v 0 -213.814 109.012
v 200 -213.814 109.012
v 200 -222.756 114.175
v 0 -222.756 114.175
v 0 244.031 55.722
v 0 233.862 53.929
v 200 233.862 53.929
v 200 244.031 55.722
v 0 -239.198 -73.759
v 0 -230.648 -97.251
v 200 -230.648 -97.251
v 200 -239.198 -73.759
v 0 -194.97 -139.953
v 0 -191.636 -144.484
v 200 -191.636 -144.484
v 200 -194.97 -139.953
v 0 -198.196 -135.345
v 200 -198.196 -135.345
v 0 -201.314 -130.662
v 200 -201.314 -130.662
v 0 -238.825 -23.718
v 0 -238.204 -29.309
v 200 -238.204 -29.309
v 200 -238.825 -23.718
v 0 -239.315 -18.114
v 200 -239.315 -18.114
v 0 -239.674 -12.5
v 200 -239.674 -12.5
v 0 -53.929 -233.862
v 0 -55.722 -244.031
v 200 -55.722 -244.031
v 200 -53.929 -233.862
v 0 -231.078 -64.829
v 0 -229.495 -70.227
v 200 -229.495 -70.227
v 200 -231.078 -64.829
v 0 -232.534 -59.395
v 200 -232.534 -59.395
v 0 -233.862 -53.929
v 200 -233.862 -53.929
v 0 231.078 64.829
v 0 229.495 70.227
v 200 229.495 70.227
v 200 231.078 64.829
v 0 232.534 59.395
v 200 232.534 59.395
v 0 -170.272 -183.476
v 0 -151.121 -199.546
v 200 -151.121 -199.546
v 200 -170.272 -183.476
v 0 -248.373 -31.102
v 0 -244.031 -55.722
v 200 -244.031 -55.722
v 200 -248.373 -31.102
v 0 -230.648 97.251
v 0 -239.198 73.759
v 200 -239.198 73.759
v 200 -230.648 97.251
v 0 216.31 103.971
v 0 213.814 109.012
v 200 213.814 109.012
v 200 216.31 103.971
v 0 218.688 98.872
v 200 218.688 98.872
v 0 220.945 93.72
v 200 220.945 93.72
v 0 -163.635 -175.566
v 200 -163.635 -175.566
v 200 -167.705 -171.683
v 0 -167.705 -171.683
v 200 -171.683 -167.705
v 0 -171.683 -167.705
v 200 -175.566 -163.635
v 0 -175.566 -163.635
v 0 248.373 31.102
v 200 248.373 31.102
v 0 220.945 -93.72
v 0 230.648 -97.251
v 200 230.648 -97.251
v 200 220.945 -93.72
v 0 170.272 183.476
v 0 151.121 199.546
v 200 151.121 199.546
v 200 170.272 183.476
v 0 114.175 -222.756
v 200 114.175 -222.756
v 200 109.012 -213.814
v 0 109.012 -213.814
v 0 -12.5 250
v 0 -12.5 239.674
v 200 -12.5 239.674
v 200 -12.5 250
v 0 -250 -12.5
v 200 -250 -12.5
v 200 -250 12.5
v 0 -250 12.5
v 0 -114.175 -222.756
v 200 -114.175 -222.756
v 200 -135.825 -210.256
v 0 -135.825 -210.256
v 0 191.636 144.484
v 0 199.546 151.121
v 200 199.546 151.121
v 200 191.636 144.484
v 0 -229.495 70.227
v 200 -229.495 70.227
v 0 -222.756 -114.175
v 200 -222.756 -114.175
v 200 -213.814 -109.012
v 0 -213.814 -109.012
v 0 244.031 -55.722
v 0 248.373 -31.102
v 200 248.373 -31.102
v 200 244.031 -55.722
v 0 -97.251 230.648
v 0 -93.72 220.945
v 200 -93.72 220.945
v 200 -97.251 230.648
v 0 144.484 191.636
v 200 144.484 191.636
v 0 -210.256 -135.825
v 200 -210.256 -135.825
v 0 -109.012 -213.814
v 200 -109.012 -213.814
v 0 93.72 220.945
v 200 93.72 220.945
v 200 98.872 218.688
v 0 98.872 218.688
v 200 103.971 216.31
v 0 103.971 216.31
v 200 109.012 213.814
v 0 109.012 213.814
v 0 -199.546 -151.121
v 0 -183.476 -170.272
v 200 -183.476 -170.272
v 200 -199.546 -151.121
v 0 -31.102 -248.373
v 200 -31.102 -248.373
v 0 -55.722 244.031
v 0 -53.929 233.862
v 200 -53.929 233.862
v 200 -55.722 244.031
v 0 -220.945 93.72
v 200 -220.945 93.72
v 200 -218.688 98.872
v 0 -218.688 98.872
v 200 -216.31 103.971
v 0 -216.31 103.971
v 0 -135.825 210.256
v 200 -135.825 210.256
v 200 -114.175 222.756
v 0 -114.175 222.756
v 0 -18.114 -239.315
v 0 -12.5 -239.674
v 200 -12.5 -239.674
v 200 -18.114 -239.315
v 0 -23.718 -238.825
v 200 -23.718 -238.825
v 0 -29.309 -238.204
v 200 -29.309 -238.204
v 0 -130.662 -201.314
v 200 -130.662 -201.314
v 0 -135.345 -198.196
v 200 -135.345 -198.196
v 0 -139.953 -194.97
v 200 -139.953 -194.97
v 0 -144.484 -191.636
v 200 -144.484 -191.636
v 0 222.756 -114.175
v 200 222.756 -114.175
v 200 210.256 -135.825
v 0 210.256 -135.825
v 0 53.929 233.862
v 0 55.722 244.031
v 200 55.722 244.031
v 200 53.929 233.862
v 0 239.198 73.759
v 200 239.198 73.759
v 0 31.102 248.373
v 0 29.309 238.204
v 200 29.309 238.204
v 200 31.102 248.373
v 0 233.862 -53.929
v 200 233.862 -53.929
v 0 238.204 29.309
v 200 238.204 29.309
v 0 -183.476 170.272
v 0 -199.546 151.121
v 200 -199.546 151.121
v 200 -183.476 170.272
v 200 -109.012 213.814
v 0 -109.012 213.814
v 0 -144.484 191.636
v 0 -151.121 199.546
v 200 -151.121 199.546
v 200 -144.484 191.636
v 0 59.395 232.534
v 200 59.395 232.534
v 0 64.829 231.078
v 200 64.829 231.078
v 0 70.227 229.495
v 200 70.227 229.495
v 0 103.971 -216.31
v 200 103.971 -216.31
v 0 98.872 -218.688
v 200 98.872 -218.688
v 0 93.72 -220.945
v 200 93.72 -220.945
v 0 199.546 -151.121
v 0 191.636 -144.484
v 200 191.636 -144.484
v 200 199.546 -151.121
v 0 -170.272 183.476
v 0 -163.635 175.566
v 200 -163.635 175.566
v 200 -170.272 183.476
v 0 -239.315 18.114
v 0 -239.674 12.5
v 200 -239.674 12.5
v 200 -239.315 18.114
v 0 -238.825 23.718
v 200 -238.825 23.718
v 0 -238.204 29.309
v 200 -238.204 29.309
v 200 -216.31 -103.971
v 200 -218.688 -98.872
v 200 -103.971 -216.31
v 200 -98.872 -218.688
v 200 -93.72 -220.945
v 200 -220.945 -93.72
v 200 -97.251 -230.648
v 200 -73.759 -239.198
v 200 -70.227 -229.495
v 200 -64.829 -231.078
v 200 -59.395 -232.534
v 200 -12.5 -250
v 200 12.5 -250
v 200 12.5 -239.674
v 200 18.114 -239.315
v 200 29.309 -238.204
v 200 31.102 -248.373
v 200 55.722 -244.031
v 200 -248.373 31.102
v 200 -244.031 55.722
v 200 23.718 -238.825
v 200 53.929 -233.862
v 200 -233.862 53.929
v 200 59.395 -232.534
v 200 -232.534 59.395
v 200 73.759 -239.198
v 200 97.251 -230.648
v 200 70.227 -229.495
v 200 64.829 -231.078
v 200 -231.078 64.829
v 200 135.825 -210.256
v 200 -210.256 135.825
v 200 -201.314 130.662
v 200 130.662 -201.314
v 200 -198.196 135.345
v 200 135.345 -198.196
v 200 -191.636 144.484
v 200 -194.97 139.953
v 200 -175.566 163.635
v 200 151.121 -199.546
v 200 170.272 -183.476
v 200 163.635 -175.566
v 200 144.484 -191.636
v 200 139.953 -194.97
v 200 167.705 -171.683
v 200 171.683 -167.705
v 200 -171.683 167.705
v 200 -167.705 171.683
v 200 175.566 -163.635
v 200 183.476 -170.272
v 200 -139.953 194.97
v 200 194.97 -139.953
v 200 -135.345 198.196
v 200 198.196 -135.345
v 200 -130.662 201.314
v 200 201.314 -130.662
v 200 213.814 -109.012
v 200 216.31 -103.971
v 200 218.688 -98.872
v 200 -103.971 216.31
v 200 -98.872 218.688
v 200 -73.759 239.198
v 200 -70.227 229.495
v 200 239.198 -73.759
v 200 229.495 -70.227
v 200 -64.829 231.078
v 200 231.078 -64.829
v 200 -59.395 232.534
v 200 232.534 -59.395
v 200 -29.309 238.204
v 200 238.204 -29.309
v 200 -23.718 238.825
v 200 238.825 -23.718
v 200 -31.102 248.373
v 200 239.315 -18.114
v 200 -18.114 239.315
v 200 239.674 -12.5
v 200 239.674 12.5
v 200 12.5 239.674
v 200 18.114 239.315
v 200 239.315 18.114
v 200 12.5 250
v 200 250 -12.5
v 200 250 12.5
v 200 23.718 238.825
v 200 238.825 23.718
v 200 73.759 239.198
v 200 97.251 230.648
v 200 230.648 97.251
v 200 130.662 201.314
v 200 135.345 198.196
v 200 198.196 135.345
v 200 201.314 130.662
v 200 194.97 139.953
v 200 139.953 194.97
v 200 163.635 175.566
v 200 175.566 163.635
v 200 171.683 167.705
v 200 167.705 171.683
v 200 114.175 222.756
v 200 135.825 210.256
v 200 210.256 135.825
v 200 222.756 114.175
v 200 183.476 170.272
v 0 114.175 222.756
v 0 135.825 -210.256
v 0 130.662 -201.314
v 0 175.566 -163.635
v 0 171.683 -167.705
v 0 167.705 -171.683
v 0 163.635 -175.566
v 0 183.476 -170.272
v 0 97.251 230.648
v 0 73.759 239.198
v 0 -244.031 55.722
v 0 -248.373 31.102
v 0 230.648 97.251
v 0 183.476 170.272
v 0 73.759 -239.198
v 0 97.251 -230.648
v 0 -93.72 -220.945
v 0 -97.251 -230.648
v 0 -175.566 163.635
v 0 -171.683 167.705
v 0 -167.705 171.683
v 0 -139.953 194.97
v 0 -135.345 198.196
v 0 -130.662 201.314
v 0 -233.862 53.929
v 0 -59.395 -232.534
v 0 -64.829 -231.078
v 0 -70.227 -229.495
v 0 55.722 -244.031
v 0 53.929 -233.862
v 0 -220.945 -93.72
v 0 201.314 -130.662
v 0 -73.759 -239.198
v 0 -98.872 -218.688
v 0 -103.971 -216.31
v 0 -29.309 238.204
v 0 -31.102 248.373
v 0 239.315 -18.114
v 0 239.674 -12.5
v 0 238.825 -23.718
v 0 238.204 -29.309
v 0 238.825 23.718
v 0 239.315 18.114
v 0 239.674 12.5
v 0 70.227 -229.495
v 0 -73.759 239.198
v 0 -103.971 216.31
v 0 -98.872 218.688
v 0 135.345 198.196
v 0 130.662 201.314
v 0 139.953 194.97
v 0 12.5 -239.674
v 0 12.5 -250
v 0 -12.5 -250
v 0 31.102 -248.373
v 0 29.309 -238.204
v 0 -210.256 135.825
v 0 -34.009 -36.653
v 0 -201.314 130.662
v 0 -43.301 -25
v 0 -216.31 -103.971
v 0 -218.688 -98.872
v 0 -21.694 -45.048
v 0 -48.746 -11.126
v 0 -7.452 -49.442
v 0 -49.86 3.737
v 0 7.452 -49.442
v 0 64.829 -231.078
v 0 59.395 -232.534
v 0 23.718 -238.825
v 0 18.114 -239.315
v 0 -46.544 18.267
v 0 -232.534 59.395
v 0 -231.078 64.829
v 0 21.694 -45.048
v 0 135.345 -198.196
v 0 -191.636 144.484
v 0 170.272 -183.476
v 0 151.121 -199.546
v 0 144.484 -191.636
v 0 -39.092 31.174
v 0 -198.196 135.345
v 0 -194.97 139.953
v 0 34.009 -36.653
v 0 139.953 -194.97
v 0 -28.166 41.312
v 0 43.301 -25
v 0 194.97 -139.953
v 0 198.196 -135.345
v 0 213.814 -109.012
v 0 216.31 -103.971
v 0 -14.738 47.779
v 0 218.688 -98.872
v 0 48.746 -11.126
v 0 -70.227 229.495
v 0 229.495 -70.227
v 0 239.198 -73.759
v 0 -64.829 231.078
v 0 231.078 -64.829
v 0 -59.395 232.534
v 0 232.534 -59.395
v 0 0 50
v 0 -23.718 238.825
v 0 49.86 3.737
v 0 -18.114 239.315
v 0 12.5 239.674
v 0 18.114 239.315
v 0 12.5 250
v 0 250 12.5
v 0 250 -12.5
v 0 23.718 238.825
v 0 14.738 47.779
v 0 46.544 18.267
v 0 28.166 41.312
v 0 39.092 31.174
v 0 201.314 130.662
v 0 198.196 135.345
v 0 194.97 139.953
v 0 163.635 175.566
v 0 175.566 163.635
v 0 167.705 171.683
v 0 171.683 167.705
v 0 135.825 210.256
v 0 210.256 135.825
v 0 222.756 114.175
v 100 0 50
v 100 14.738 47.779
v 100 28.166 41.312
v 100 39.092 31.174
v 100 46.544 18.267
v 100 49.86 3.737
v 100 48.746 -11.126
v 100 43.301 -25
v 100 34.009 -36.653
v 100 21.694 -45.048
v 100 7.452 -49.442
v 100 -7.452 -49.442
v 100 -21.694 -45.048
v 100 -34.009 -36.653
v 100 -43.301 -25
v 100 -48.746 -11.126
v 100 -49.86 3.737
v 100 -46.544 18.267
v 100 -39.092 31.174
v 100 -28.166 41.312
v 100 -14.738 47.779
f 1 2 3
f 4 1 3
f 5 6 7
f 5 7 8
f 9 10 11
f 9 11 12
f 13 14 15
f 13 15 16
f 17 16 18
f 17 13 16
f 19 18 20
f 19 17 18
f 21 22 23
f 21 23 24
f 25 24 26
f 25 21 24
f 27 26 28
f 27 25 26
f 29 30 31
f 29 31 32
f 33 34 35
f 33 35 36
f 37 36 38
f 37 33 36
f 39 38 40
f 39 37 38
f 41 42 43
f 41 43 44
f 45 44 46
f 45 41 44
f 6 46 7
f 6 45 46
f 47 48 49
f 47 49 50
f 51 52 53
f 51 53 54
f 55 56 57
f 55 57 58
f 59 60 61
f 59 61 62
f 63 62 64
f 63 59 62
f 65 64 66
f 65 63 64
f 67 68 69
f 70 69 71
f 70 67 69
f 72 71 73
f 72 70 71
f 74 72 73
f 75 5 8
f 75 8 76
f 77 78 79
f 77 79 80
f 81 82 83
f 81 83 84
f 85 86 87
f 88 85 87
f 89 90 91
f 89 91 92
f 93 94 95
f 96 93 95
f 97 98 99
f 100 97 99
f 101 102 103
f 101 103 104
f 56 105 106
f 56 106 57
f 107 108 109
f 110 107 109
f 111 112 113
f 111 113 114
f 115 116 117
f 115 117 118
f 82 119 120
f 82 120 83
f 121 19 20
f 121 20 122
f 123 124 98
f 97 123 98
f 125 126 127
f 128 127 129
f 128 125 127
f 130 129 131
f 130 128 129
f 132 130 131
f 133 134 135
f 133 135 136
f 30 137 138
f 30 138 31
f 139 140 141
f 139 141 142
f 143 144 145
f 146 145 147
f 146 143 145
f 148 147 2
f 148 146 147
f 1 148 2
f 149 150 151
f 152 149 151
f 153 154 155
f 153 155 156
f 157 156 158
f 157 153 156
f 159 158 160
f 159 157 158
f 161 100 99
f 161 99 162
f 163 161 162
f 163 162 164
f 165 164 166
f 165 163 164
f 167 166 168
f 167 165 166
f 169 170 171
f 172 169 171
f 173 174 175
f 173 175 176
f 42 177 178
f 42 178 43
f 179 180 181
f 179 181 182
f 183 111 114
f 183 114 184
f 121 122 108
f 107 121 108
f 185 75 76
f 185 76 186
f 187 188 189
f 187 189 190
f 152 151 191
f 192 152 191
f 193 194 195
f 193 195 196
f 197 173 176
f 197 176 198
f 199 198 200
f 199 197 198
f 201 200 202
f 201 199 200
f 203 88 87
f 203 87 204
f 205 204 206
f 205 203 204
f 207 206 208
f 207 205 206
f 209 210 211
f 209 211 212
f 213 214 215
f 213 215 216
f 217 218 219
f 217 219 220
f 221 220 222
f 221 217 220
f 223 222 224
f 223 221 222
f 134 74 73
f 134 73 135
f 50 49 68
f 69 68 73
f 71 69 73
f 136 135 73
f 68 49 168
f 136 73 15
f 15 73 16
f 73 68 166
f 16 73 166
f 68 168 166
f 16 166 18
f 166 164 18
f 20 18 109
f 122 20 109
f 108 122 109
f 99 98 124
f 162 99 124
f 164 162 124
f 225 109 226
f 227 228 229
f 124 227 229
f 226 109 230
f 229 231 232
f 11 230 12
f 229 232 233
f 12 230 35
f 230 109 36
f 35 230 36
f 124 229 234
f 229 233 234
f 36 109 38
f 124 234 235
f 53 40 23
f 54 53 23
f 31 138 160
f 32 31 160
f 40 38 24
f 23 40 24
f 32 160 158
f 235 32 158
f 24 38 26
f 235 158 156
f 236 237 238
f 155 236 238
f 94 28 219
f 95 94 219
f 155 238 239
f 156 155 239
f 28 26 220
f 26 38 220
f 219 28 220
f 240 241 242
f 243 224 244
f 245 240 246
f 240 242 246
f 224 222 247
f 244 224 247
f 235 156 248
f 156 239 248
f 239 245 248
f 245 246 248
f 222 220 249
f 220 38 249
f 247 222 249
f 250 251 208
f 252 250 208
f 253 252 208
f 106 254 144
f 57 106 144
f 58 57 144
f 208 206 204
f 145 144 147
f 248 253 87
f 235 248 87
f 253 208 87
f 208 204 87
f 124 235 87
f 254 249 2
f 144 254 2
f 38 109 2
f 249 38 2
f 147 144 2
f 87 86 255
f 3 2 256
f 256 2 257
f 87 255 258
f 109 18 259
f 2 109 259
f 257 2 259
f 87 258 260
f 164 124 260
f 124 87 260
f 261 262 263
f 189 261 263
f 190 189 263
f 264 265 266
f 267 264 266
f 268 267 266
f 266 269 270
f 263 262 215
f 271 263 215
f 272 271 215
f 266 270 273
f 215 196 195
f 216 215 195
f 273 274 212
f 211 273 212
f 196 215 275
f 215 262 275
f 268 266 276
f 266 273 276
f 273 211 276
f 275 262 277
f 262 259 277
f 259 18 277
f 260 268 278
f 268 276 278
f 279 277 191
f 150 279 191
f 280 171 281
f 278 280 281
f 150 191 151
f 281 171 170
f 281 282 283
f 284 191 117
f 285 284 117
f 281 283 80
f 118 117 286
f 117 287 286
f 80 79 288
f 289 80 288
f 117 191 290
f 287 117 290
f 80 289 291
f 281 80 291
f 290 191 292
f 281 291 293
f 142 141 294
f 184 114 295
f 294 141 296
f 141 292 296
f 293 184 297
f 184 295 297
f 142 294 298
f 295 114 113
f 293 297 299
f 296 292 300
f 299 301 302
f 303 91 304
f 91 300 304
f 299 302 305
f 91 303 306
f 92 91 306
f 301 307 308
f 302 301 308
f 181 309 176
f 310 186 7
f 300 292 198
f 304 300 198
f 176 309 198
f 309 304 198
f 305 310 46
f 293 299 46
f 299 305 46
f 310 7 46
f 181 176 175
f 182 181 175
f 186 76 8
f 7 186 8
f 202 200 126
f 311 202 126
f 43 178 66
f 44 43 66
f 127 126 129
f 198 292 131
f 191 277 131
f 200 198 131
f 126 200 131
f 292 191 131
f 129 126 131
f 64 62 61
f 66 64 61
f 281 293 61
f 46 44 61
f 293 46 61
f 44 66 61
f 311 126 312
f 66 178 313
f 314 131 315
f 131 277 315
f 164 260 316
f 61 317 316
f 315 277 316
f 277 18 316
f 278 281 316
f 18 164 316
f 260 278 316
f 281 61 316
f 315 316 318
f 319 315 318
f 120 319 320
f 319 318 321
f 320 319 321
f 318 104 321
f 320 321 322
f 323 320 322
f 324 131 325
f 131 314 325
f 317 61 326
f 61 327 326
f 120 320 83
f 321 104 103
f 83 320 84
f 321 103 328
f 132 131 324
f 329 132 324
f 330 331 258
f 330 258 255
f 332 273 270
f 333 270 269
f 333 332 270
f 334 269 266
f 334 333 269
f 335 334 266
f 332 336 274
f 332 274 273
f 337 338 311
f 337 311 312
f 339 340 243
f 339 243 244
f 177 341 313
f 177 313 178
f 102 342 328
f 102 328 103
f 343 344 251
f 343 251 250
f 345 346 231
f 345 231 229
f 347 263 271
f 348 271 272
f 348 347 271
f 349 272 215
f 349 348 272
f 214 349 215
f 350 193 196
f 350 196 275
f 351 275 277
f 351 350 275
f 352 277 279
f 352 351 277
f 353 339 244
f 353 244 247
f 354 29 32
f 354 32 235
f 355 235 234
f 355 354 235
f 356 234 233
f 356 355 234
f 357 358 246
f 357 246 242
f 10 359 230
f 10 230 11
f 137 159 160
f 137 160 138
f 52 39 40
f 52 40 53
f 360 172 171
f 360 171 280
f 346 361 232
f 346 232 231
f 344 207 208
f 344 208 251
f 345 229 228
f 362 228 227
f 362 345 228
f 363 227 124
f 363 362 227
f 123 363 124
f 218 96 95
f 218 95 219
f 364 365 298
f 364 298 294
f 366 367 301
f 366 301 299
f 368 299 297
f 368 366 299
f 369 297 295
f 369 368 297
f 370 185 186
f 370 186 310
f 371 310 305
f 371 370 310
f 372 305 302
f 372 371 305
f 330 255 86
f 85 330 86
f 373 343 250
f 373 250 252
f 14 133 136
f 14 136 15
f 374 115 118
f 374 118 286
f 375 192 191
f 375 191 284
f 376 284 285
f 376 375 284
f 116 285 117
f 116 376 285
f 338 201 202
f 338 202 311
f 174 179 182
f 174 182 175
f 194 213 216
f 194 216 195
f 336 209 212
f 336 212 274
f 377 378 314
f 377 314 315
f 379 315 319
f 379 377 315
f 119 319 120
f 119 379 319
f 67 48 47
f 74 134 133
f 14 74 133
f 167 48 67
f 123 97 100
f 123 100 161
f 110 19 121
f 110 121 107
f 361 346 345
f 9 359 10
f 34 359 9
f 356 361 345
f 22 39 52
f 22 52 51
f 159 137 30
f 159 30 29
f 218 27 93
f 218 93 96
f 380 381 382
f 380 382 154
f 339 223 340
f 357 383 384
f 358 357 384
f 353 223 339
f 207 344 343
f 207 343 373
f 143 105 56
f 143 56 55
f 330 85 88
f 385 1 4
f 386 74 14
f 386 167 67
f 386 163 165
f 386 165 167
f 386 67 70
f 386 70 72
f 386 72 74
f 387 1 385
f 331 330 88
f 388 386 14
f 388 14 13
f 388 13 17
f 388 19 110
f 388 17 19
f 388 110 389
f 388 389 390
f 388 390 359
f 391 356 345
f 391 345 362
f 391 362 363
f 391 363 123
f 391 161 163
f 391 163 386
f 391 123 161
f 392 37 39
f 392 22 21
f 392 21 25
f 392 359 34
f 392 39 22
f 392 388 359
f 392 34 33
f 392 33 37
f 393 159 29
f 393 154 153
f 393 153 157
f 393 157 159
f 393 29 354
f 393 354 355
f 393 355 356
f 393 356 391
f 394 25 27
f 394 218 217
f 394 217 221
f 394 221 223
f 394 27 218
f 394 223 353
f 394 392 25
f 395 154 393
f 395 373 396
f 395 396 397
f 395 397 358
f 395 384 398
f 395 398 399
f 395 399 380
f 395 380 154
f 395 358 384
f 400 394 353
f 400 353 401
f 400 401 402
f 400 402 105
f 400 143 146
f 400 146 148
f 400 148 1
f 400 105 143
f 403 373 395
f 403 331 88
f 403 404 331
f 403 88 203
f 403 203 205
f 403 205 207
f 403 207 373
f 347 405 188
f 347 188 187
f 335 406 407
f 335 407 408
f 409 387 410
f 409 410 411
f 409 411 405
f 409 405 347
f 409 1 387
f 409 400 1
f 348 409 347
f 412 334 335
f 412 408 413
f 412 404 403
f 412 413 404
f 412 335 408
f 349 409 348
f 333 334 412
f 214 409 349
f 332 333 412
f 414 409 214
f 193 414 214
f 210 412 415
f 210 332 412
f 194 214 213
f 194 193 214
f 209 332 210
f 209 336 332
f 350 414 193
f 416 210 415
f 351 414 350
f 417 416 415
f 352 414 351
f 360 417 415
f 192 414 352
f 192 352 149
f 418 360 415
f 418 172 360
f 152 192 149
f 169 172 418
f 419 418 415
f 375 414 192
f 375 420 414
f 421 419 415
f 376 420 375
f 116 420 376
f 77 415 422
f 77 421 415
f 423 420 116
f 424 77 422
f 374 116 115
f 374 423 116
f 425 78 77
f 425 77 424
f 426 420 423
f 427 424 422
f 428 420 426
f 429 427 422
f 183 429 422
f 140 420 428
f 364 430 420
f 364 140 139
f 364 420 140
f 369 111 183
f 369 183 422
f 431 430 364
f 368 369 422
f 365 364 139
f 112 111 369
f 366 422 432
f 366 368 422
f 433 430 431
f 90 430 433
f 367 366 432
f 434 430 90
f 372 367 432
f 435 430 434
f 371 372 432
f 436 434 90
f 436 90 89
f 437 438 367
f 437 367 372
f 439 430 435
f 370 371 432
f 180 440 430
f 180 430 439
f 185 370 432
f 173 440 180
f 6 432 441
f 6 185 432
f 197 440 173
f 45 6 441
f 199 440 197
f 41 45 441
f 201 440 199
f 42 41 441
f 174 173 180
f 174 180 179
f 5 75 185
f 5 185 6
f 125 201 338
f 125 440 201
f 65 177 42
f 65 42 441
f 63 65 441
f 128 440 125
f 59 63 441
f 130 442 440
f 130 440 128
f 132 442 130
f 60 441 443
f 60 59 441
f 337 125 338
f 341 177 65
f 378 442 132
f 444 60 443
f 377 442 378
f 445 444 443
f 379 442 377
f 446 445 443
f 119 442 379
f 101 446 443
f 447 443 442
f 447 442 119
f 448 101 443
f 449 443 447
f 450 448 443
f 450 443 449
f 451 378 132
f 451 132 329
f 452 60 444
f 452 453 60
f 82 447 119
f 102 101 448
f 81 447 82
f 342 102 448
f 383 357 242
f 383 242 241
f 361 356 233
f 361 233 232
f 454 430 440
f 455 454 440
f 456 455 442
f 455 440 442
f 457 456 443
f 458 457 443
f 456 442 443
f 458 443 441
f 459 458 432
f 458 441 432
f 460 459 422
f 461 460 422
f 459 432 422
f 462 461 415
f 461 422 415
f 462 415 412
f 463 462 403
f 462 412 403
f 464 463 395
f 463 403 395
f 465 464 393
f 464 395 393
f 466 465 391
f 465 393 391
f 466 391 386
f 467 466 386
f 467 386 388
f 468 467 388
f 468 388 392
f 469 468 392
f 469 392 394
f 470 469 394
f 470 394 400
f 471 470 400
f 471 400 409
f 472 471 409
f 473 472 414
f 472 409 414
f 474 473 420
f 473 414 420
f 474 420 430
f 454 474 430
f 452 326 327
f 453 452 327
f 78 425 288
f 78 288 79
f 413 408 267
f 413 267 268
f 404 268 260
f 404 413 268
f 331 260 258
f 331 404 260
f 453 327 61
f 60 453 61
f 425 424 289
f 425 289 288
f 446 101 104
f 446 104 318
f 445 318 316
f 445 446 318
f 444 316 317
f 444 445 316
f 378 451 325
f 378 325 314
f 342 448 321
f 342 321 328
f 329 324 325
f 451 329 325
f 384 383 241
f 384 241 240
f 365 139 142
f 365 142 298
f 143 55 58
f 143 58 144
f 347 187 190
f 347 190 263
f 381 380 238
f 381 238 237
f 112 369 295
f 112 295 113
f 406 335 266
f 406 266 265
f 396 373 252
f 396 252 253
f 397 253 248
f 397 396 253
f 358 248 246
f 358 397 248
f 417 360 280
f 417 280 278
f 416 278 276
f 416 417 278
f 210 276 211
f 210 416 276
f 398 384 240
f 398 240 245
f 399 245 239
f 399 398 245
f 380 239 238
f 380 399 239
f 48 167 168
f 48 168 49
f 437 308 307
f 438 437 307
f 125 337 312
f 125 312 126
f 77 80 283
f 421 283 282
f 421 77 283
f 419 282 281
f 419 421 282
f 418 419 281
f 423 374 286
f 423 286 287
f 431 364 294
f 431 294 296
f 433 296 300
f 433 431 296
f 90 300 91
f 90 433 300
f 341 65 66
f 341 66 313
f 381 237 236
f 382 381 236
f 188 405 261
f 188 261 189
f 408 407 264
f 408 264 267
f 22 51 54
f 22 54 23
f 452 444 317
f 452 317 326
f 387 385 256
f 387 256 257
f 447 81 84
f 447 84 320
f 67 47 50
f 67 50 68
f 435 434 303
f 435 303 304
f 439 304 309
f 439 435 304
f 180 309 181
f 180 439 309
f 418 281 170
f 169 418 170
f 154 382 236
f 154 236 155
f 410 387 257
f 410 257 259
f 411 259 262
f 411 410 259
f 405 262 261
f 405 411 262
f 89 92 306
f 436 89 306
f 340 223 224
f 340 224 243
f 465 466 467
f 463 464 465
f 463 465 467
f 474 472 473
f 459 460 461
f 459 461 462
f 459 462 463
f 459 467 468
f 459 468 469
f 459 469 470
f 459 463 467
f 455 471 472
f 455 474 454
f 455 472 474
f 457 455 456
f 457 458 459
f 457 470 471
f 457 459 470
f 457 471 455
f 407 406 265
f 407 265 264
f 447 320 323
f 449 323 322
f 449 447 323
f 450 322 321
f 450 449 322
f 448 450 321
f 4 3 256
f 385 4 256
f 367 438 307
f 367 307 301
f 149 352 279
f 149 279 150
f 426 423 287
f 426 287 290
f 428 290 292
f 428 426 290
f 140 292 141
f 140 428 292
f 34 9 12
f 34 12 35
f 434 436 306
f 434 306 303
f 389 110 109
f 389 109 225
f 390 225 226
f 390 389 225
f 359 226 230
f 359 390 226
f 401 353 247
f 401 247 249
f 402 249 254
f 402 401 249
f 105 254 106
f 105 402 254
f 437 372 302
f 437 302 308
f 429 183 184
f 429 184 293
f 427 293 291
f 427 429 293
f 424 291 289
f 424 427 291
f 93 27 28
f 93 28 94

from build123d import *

# Parameters (mm, degrees)
BOSS_EXTRUDE1_DEPTH = 200
SKETCH2_R           = 50
CUT_EXTRUDE1_DEPTH  = 100


with BuildPart() as part:
    # Sketch1 → Boss-Extrude1 (new body)
    with BuildSketch(Plane(origin=(0, 0, 0), x_dir=(0, 0, -1), z_dir=(1, 0, 0))):
        with BuildLine():
            Line((-12.5, 250), (12.5, 250))
            Line((12.5, 250), (12.5, 239.674258109))
            ThreePointArc((12.5, 239.674258109), (20.917378259, 239.086727542), (29.308901242, 238.203669804))
            Line((29.308901242, 238.203669804), (31.101947504, 248.372540474))
            Line((31.101947504, 248.372540474), (55.722141329, 244.031336032))
            Line((55.722141329, 244.031336032), (53.929095067, 233.862465362))
            ThreePointArc((53.929095067, 233.862465362), (62.116570825, 231.822198309), (70.22726635, 229.495383529))
            Line((70.22726635, 229.495383529), (73.758878072, 239.198406988))
            Line((73.758878072, 239.198406988), (97.251193591, 230.647903405))
            Line((97.251193591, 230.647903405), (93.71958187, 220.944879946))
            ThreePointArc((93.71958187, 220.944879946), (101.428382818, 217.513868889), (109.011811507, 213.813996155))
            Line((109.011811507, 213.813996155), (114.174682453, 222.756350946))
            Line((114.174682453, 222.756350946), (135.825317547, 210.256350946))
            Line((135.825317547, 210.256350946), (130.662446602, 201.313996155))
            ThreePointArc((130.662446602, 201.313996155), (137.658344724, 196.596490629), (144.484087934, 191.635978704))
            Line((144.484087934, 191.635978704), (151.121346883, 199.545955901))
            Line((151.121346883, 199.545955901), (170.272457961, 183.476265659))
            Line((170.272457961, 183.476265659), (163.635199012, 175.566288462))
            ThreePointArc((163.635199012, 175.566288462), (169.705627485, 169.705627485), (175.566288462, 163.635199012))
            Line((175.566288462, 163.635199012), (183.476265659, 170.272457961))
            Line((183.476265659, 170.272457961), (199.545955901, 151.121346883))
            Line((199.545955901, 151.121346883), (191.635978704, 144.484087934))
            ThreePointArc((191.635978704, 144.484087934), (196.596490629, 137.658344724), (201.313996155, 130.662446602))
            Line((201.313996155, 130.662446602), (210.256350946, 135.825317547))
            Line((210.256350946, 135.825317547), (222.756350946, 114.174682453))
            Line((222.756350946, 114.174682453), (213.813996155, 109.011811507))
            ThreePointArc((213.813996155, 109.011811507), (217.513868889, 101.428382818), (220.944879946, 93.71958187))
            Line((220.944879946, 93.71958187), (230.647903405, 97.251193591))
            Line((230.647903405, 97.251193591), (239.198406988, 73.758878072))
            Line((239.198406988, 73.758878072), (229.495383529, 70.22726635))
            ThreePointArc((229.495383529, 70.22726635), (231.822198309, 62.116570825), (233.862465362, 53.929095067))
            Line((233.862465362, 53.929095067), (244.031336032, 55.722141329))
            Line((244.031336032, 55.722141329), (248.372540474, 31.101947504))
            Line((248.372540474, 31.101947504), (238.203669804, 29.308901242))
            ThreePointArc((238.203669804, 29.308901242), (239.086727542, 20.917378259), (239.674258109, 12.5))
            Line((239.674258109, 12.5), (250, 12.5))
            Line((250, 12.5), (250, -12.5))
            Line((250, -12.5), (239.674258109, -12.5))
            ThreePointArc((239.674258109, -12.5), (239.086727542, -20.917378259), (238.203669804, -29.308901242))
            Line((238.203669804, -29.308901242), (248.372540474, -31.101947504))
            Line((248.372540474, -31.101947504), (244.031336032, -55.722141329))
            Line((244.031336032, -55.722141329), (233.862465362, -53.929095067))
            ThreePointArc((233.862465362, -53.929095067), (231.822198309, -62.116570825), (229.495383529, -70.22726635))
            Line((229.495383529, -70.22726635), (239.198406988, -73.758878072))
            Line((239.198406988, -73.758878072), (230.647903405, -97.251193591))
            Line((230.647903405, -97.251193591), (220.944879946, -93.71958187))
            ThreePointArc((220.944879946, -93.71958187), (217.513868889, -101.428382818), (213.813996155, -109.011811507))
            Line((213.813996155, -109.011811507), (222.756350946, -114.174682453))
            Line((222.756350946, -114.174682453), (210.256350946, -135.825317547))
            Line((210.256350946, -135.825317547), (201.313996155, -130.662446602))
            ThreePointArc((201.313996155, -130.662446602), (196.596490629, -137.658344724), (191.635978704, -144.484087934))
            Line((191.635978704, -144.484087934), (199.545955901, -151.121346883))
            Line((199.545955901, -151.121346883), (183.476265659, -170.272457961))
            Line((183.476265659, -170.272457961), (175.566288462, -163.635199012))
            ThreePointArc((175.566288462, -163.635199012), (169.705627485, -169.705627485), (163.635199012, -175.566288462))
            Line((163.635199012, -175.566288462), (170.272457961, -183.476265659))
            Line((170.272457961, -183.476265659), (151.121346883, -199.545955901))
            Line((151.121346883, -199.545955901), (144.484087934, -191.635978704))
            ThreePointArc((144.484087934, -191.635978704), (137.658344724, -196.596490629), (130.662446602, -201.313996155))
            Line((130.662446602, -201.313996155), (135.825317547, -210.256350946))
            Line((135.825317547, -210.256350946), (114.174682453, -222.756350946))
            Line((114.174682453, -222.756350946), (109.011811507, -213.813996155))
            ThreePointArc((109.011811507, -213.813996155), (101.428382818, -217.513868889), (93.71958187, -220.944879946))
            Line((93.71958187, -220.944879946), (97.251193591, -230.647903405))
            Line((97.251193591, -230.647903405), (73.758878072, -239.198406988))
            Line((73.758878072, -239.198406988), (70.22726635, -229.495383529))
            ThreePointArc((70.22726635, -229.495383529), (62.116570825, -231.822198309), (53.929095067, -233.862465362))
            Line((53.929095067, -233.862465362), (55.722141329, -244.031336032))
            Line((55.722141329, -244.031336032), (31.101947504, -248.372540474))
            Line((31.101947504, -248.372540474), (29.308901242, -238.203669804))
            ThreePointArc((29.308901242, -238.203669804), (20.917378259, -239.086727542), (12.5, -239.674258109))
            Line((12.5, -239.674258109), (12.5, -250))
            Line((12.5, -250), (-12.5, -250))
            Line((-12.5, -250), (-12.5, -239.674258109))
            ThreePointArc((-12.5, -239.674258109), (-20.917378259, -239.086727542), (-29.308901242, -238.203669804))
            Line((-29.308901242, -238.203669804), (-31.101947504, -248.372540474))
            Line((-31.101947504, -248.372540474), (-55.722141329, -244.031336032))
            Line((-55.722141329, -244.031336032), (-53.929095067, -233.862465362))
            ThreePointArc((-53.929095067, -233.862465362), (-62.116570825, -231.822198309), (-70.22726635, -229.495383529))
            Line((-70.22726635, -229.495383529), (-73.758878072, -239.198406988))
            Line((-73.758878072, -239.198406988), (-97.251193591, -230.647903405))
            Line((-97.251193591, -230.647903405), (-93.71958187, -220.944879946))
            ThreePointArc((-93.71958187, -220.944879946), (-101.428382818, -217.513868889), (-109.011811507, -213.813996155))
            Line((-109.011811507, -213.813996155), (-114.174682453, -222.756350946))
            Line((-114.174682453, -222.756350946), (-135.825317547, -210.256350946))
            Line((-135.825317547, -210.256350946), (-130.662446602, -201.313996155))
            ThreePointArc((-130.662446602, -201.313996155), (-137.658344724, -196.596490629), (-144.484087934, -191.635978704))
            Line((-144.484087934, -191.635978704), (-151.121346883, -199.545955901))
            Line((-151.121346883, -199.545955901), (-170.272457961, -183.476265659))
            Line((-170.272457961, -183.476265659), (-163.635199012, -175.566288462))
            ThreePointArc((-163.635199012, -175.566288462), (-169.705627485, -169.705627485), (-175.566288462, -163.635199012))
            Line((-175.566288462, -163.635199012), (-183.476265659, -170.272457961))
            Line((-183.476265659, -170.272457961), (-199.545955901, -151.121346883))
            Line((-199.545955901, -151.121346883), (-191.635978704, -144.484087934))
            ThreePointArc((-191.635978704, -144.484087934), (-196.596490629, -137.658344724), (-201.313996155, -130.662446602))
            Line((-201.313996155, -130.662446602), (-210.256350946, -135.825317547))
            Line((-210.256350946, -135.825317547), (-222.756350946, -114.174682453))
            Line((-222.756350946, -114.174682453), (-213.813996155, -109.011811507))
            ThreePointArc((-213.813996155, -109.011811507), (-217.513868889, -101.428382818), (-220.944879946, -93.71958187))
            Line((-220.944879946, -93.71958187), (-230.647903405, -97.251193591))
            Line((-230.647903405, -97.251193591), (-239.198406988, -73.758878072))
            Line((-239.198406988, -73.758878072), (-229.495383529, -70.22726635))
            ThreePointArc((-229.495383529, -70.22726635), (-231.822198309, -62.116570825), (-233.862465362, -53.929095067))
            Line((-233.862465362, -53.929095067), (-244.031336032, -55.722141329))
            Line((-244.031336032, -55.722141329), (-248.372540474, -31.101947504))
            Line((-248.372540474, -31.101947504), (-238.203669804, -29.308901242))
            ThreePointArc((-238.203669804, -29.308901242), (-239.086727542, -20.917378259), (-239.674258109, -12.5))
            Line((-239.674258109, -12.5), (-250, -12.5))
            Line((-250, -12.5), (-250, 12.5))
            Line((-250, 12.5), (-239.674258109, 12.5))
            ThreePointArc((-239.674258109, 12.5), (-239.086727542, 20.917378259), (-238.203669804, 29.308901242))
            Line((-238.203669804, 29.308901242), (-248.372540474, 31.101947504))
            Line((-248.372540474, 31.101947504), (-244.031336032, 55.722141329))
            Line((-244.031336032, 55.722141329), (-233.862465362, 53.929095067))
            ThreePointArc((-233.862465362, 53.929095067), (-231.822198309, 62.116570825), (-229.495383529, 70.22726635))
            Line((-229.495383529, 70.22726635), (-239.198406988, 73.758878072))
            Line((-239.198406988, 73.758878072), (-230.647903405, 97.251193591))
            Line((-230.647903405, 97.251193591), (-220.944879946, 93.71958187))
            ThreePointArc((-220.944879946, 93.71958187), (-217.513868889, 101.428382818), (-213.813996155, 109.011811507))
            Line((-213.813996155, 109.011811507), (-222.756350946, 114.174682453))
            Line((-222.756350946, 114.174682453), (-210.256350946, 135.825317547))
            Line((-210.256350946, 135.825317547), (-201.313996155, 130.662446602))
            ThreePointArc((-201.313996155, 130.662446602), (-196.596490629, 137.658344724), (-191.635978704, 144.484087934))
            Line((-191.635978704, 144.484087934), (-199.545955901, 151.121346883))
            Line((-199.545955901, 151.121346883), (-183.476265659, 170.272457961))
            Line((-183.476265659, 170.272457961), (-175.566288462, 163.635199012))
            ThreePointArc((-175.566288462, 163.635199012), (-169.705627485, 169.705627485), (-163.635199012, 175.566288462))
            Line((-163.635199012, 175.566288462), (-170.272457961, 183.476265659))
            Line((-170.272457961, 183.476265659), (-151.121346883, 199.545955901))
            Line((-151.121346883, 199.545955901), (-144.484087934, 191.635978704))
            ThreePointArc((-144.484087934, 191.635978704), (-137.658344724, 196.596490629), (-130.662446602, 201.313996155))
            Line((-130.662446602, 201.313996155), (-135.825317547, 210.256350946))
            Line((-135.825317547, 210.256350946), (-114.174682453, 222.756350946))
            Line((-114.174682453, 222.756350946), (-109.011811507, 213.813996155))
            ThreePointArc((-109.011811507, 213.813996155), (-101.428382818, 217.513868889), (-93.71958187, 220.944879946))
            Line((-93.71958187, 220.944879946), (-97.251193591, 230.647903405))
            Line((-97.251193591, 230.647903405), (-73.758878072, 239.198406988))
            Line((-73.758878072, 239.198406988), (-70.22726635, 229.495383529))
            ThreePointArc((-70.22726635, 229.495383529), (-62.116570825, 231.822198309), (-53.929095067, 233.862465362))
            Line((-53.929095067, 233.862465362), (-55.722141329, 244.031336032))
            Line((-55.722141329, 244.031336032), (-31.101947504, 248.372540474))
            Line((-31.101947504, 248.372540474), (-29.308901242, 238.203669804))
            ThreePointArc((-29.308901242, 238.203669804), (-20.917378259, 239.086727542), (-12.5, 239.674258109))
            Line((-12.5, 239.674258109), (-12.5, 250))
        make_face()
    extrude(amount=BOSS_EXTRUDE1_DEPTH)

    # Sketch2 → Cut-Extrude1 (cut)
    with BuildSketch(Plane.ZY):
        Circle(SKETCH2_R)
    extrude(amount=-CUT_EXTRUDE1_DEPTH, mode=Mode.SUBTRACT)


solid = part.part
